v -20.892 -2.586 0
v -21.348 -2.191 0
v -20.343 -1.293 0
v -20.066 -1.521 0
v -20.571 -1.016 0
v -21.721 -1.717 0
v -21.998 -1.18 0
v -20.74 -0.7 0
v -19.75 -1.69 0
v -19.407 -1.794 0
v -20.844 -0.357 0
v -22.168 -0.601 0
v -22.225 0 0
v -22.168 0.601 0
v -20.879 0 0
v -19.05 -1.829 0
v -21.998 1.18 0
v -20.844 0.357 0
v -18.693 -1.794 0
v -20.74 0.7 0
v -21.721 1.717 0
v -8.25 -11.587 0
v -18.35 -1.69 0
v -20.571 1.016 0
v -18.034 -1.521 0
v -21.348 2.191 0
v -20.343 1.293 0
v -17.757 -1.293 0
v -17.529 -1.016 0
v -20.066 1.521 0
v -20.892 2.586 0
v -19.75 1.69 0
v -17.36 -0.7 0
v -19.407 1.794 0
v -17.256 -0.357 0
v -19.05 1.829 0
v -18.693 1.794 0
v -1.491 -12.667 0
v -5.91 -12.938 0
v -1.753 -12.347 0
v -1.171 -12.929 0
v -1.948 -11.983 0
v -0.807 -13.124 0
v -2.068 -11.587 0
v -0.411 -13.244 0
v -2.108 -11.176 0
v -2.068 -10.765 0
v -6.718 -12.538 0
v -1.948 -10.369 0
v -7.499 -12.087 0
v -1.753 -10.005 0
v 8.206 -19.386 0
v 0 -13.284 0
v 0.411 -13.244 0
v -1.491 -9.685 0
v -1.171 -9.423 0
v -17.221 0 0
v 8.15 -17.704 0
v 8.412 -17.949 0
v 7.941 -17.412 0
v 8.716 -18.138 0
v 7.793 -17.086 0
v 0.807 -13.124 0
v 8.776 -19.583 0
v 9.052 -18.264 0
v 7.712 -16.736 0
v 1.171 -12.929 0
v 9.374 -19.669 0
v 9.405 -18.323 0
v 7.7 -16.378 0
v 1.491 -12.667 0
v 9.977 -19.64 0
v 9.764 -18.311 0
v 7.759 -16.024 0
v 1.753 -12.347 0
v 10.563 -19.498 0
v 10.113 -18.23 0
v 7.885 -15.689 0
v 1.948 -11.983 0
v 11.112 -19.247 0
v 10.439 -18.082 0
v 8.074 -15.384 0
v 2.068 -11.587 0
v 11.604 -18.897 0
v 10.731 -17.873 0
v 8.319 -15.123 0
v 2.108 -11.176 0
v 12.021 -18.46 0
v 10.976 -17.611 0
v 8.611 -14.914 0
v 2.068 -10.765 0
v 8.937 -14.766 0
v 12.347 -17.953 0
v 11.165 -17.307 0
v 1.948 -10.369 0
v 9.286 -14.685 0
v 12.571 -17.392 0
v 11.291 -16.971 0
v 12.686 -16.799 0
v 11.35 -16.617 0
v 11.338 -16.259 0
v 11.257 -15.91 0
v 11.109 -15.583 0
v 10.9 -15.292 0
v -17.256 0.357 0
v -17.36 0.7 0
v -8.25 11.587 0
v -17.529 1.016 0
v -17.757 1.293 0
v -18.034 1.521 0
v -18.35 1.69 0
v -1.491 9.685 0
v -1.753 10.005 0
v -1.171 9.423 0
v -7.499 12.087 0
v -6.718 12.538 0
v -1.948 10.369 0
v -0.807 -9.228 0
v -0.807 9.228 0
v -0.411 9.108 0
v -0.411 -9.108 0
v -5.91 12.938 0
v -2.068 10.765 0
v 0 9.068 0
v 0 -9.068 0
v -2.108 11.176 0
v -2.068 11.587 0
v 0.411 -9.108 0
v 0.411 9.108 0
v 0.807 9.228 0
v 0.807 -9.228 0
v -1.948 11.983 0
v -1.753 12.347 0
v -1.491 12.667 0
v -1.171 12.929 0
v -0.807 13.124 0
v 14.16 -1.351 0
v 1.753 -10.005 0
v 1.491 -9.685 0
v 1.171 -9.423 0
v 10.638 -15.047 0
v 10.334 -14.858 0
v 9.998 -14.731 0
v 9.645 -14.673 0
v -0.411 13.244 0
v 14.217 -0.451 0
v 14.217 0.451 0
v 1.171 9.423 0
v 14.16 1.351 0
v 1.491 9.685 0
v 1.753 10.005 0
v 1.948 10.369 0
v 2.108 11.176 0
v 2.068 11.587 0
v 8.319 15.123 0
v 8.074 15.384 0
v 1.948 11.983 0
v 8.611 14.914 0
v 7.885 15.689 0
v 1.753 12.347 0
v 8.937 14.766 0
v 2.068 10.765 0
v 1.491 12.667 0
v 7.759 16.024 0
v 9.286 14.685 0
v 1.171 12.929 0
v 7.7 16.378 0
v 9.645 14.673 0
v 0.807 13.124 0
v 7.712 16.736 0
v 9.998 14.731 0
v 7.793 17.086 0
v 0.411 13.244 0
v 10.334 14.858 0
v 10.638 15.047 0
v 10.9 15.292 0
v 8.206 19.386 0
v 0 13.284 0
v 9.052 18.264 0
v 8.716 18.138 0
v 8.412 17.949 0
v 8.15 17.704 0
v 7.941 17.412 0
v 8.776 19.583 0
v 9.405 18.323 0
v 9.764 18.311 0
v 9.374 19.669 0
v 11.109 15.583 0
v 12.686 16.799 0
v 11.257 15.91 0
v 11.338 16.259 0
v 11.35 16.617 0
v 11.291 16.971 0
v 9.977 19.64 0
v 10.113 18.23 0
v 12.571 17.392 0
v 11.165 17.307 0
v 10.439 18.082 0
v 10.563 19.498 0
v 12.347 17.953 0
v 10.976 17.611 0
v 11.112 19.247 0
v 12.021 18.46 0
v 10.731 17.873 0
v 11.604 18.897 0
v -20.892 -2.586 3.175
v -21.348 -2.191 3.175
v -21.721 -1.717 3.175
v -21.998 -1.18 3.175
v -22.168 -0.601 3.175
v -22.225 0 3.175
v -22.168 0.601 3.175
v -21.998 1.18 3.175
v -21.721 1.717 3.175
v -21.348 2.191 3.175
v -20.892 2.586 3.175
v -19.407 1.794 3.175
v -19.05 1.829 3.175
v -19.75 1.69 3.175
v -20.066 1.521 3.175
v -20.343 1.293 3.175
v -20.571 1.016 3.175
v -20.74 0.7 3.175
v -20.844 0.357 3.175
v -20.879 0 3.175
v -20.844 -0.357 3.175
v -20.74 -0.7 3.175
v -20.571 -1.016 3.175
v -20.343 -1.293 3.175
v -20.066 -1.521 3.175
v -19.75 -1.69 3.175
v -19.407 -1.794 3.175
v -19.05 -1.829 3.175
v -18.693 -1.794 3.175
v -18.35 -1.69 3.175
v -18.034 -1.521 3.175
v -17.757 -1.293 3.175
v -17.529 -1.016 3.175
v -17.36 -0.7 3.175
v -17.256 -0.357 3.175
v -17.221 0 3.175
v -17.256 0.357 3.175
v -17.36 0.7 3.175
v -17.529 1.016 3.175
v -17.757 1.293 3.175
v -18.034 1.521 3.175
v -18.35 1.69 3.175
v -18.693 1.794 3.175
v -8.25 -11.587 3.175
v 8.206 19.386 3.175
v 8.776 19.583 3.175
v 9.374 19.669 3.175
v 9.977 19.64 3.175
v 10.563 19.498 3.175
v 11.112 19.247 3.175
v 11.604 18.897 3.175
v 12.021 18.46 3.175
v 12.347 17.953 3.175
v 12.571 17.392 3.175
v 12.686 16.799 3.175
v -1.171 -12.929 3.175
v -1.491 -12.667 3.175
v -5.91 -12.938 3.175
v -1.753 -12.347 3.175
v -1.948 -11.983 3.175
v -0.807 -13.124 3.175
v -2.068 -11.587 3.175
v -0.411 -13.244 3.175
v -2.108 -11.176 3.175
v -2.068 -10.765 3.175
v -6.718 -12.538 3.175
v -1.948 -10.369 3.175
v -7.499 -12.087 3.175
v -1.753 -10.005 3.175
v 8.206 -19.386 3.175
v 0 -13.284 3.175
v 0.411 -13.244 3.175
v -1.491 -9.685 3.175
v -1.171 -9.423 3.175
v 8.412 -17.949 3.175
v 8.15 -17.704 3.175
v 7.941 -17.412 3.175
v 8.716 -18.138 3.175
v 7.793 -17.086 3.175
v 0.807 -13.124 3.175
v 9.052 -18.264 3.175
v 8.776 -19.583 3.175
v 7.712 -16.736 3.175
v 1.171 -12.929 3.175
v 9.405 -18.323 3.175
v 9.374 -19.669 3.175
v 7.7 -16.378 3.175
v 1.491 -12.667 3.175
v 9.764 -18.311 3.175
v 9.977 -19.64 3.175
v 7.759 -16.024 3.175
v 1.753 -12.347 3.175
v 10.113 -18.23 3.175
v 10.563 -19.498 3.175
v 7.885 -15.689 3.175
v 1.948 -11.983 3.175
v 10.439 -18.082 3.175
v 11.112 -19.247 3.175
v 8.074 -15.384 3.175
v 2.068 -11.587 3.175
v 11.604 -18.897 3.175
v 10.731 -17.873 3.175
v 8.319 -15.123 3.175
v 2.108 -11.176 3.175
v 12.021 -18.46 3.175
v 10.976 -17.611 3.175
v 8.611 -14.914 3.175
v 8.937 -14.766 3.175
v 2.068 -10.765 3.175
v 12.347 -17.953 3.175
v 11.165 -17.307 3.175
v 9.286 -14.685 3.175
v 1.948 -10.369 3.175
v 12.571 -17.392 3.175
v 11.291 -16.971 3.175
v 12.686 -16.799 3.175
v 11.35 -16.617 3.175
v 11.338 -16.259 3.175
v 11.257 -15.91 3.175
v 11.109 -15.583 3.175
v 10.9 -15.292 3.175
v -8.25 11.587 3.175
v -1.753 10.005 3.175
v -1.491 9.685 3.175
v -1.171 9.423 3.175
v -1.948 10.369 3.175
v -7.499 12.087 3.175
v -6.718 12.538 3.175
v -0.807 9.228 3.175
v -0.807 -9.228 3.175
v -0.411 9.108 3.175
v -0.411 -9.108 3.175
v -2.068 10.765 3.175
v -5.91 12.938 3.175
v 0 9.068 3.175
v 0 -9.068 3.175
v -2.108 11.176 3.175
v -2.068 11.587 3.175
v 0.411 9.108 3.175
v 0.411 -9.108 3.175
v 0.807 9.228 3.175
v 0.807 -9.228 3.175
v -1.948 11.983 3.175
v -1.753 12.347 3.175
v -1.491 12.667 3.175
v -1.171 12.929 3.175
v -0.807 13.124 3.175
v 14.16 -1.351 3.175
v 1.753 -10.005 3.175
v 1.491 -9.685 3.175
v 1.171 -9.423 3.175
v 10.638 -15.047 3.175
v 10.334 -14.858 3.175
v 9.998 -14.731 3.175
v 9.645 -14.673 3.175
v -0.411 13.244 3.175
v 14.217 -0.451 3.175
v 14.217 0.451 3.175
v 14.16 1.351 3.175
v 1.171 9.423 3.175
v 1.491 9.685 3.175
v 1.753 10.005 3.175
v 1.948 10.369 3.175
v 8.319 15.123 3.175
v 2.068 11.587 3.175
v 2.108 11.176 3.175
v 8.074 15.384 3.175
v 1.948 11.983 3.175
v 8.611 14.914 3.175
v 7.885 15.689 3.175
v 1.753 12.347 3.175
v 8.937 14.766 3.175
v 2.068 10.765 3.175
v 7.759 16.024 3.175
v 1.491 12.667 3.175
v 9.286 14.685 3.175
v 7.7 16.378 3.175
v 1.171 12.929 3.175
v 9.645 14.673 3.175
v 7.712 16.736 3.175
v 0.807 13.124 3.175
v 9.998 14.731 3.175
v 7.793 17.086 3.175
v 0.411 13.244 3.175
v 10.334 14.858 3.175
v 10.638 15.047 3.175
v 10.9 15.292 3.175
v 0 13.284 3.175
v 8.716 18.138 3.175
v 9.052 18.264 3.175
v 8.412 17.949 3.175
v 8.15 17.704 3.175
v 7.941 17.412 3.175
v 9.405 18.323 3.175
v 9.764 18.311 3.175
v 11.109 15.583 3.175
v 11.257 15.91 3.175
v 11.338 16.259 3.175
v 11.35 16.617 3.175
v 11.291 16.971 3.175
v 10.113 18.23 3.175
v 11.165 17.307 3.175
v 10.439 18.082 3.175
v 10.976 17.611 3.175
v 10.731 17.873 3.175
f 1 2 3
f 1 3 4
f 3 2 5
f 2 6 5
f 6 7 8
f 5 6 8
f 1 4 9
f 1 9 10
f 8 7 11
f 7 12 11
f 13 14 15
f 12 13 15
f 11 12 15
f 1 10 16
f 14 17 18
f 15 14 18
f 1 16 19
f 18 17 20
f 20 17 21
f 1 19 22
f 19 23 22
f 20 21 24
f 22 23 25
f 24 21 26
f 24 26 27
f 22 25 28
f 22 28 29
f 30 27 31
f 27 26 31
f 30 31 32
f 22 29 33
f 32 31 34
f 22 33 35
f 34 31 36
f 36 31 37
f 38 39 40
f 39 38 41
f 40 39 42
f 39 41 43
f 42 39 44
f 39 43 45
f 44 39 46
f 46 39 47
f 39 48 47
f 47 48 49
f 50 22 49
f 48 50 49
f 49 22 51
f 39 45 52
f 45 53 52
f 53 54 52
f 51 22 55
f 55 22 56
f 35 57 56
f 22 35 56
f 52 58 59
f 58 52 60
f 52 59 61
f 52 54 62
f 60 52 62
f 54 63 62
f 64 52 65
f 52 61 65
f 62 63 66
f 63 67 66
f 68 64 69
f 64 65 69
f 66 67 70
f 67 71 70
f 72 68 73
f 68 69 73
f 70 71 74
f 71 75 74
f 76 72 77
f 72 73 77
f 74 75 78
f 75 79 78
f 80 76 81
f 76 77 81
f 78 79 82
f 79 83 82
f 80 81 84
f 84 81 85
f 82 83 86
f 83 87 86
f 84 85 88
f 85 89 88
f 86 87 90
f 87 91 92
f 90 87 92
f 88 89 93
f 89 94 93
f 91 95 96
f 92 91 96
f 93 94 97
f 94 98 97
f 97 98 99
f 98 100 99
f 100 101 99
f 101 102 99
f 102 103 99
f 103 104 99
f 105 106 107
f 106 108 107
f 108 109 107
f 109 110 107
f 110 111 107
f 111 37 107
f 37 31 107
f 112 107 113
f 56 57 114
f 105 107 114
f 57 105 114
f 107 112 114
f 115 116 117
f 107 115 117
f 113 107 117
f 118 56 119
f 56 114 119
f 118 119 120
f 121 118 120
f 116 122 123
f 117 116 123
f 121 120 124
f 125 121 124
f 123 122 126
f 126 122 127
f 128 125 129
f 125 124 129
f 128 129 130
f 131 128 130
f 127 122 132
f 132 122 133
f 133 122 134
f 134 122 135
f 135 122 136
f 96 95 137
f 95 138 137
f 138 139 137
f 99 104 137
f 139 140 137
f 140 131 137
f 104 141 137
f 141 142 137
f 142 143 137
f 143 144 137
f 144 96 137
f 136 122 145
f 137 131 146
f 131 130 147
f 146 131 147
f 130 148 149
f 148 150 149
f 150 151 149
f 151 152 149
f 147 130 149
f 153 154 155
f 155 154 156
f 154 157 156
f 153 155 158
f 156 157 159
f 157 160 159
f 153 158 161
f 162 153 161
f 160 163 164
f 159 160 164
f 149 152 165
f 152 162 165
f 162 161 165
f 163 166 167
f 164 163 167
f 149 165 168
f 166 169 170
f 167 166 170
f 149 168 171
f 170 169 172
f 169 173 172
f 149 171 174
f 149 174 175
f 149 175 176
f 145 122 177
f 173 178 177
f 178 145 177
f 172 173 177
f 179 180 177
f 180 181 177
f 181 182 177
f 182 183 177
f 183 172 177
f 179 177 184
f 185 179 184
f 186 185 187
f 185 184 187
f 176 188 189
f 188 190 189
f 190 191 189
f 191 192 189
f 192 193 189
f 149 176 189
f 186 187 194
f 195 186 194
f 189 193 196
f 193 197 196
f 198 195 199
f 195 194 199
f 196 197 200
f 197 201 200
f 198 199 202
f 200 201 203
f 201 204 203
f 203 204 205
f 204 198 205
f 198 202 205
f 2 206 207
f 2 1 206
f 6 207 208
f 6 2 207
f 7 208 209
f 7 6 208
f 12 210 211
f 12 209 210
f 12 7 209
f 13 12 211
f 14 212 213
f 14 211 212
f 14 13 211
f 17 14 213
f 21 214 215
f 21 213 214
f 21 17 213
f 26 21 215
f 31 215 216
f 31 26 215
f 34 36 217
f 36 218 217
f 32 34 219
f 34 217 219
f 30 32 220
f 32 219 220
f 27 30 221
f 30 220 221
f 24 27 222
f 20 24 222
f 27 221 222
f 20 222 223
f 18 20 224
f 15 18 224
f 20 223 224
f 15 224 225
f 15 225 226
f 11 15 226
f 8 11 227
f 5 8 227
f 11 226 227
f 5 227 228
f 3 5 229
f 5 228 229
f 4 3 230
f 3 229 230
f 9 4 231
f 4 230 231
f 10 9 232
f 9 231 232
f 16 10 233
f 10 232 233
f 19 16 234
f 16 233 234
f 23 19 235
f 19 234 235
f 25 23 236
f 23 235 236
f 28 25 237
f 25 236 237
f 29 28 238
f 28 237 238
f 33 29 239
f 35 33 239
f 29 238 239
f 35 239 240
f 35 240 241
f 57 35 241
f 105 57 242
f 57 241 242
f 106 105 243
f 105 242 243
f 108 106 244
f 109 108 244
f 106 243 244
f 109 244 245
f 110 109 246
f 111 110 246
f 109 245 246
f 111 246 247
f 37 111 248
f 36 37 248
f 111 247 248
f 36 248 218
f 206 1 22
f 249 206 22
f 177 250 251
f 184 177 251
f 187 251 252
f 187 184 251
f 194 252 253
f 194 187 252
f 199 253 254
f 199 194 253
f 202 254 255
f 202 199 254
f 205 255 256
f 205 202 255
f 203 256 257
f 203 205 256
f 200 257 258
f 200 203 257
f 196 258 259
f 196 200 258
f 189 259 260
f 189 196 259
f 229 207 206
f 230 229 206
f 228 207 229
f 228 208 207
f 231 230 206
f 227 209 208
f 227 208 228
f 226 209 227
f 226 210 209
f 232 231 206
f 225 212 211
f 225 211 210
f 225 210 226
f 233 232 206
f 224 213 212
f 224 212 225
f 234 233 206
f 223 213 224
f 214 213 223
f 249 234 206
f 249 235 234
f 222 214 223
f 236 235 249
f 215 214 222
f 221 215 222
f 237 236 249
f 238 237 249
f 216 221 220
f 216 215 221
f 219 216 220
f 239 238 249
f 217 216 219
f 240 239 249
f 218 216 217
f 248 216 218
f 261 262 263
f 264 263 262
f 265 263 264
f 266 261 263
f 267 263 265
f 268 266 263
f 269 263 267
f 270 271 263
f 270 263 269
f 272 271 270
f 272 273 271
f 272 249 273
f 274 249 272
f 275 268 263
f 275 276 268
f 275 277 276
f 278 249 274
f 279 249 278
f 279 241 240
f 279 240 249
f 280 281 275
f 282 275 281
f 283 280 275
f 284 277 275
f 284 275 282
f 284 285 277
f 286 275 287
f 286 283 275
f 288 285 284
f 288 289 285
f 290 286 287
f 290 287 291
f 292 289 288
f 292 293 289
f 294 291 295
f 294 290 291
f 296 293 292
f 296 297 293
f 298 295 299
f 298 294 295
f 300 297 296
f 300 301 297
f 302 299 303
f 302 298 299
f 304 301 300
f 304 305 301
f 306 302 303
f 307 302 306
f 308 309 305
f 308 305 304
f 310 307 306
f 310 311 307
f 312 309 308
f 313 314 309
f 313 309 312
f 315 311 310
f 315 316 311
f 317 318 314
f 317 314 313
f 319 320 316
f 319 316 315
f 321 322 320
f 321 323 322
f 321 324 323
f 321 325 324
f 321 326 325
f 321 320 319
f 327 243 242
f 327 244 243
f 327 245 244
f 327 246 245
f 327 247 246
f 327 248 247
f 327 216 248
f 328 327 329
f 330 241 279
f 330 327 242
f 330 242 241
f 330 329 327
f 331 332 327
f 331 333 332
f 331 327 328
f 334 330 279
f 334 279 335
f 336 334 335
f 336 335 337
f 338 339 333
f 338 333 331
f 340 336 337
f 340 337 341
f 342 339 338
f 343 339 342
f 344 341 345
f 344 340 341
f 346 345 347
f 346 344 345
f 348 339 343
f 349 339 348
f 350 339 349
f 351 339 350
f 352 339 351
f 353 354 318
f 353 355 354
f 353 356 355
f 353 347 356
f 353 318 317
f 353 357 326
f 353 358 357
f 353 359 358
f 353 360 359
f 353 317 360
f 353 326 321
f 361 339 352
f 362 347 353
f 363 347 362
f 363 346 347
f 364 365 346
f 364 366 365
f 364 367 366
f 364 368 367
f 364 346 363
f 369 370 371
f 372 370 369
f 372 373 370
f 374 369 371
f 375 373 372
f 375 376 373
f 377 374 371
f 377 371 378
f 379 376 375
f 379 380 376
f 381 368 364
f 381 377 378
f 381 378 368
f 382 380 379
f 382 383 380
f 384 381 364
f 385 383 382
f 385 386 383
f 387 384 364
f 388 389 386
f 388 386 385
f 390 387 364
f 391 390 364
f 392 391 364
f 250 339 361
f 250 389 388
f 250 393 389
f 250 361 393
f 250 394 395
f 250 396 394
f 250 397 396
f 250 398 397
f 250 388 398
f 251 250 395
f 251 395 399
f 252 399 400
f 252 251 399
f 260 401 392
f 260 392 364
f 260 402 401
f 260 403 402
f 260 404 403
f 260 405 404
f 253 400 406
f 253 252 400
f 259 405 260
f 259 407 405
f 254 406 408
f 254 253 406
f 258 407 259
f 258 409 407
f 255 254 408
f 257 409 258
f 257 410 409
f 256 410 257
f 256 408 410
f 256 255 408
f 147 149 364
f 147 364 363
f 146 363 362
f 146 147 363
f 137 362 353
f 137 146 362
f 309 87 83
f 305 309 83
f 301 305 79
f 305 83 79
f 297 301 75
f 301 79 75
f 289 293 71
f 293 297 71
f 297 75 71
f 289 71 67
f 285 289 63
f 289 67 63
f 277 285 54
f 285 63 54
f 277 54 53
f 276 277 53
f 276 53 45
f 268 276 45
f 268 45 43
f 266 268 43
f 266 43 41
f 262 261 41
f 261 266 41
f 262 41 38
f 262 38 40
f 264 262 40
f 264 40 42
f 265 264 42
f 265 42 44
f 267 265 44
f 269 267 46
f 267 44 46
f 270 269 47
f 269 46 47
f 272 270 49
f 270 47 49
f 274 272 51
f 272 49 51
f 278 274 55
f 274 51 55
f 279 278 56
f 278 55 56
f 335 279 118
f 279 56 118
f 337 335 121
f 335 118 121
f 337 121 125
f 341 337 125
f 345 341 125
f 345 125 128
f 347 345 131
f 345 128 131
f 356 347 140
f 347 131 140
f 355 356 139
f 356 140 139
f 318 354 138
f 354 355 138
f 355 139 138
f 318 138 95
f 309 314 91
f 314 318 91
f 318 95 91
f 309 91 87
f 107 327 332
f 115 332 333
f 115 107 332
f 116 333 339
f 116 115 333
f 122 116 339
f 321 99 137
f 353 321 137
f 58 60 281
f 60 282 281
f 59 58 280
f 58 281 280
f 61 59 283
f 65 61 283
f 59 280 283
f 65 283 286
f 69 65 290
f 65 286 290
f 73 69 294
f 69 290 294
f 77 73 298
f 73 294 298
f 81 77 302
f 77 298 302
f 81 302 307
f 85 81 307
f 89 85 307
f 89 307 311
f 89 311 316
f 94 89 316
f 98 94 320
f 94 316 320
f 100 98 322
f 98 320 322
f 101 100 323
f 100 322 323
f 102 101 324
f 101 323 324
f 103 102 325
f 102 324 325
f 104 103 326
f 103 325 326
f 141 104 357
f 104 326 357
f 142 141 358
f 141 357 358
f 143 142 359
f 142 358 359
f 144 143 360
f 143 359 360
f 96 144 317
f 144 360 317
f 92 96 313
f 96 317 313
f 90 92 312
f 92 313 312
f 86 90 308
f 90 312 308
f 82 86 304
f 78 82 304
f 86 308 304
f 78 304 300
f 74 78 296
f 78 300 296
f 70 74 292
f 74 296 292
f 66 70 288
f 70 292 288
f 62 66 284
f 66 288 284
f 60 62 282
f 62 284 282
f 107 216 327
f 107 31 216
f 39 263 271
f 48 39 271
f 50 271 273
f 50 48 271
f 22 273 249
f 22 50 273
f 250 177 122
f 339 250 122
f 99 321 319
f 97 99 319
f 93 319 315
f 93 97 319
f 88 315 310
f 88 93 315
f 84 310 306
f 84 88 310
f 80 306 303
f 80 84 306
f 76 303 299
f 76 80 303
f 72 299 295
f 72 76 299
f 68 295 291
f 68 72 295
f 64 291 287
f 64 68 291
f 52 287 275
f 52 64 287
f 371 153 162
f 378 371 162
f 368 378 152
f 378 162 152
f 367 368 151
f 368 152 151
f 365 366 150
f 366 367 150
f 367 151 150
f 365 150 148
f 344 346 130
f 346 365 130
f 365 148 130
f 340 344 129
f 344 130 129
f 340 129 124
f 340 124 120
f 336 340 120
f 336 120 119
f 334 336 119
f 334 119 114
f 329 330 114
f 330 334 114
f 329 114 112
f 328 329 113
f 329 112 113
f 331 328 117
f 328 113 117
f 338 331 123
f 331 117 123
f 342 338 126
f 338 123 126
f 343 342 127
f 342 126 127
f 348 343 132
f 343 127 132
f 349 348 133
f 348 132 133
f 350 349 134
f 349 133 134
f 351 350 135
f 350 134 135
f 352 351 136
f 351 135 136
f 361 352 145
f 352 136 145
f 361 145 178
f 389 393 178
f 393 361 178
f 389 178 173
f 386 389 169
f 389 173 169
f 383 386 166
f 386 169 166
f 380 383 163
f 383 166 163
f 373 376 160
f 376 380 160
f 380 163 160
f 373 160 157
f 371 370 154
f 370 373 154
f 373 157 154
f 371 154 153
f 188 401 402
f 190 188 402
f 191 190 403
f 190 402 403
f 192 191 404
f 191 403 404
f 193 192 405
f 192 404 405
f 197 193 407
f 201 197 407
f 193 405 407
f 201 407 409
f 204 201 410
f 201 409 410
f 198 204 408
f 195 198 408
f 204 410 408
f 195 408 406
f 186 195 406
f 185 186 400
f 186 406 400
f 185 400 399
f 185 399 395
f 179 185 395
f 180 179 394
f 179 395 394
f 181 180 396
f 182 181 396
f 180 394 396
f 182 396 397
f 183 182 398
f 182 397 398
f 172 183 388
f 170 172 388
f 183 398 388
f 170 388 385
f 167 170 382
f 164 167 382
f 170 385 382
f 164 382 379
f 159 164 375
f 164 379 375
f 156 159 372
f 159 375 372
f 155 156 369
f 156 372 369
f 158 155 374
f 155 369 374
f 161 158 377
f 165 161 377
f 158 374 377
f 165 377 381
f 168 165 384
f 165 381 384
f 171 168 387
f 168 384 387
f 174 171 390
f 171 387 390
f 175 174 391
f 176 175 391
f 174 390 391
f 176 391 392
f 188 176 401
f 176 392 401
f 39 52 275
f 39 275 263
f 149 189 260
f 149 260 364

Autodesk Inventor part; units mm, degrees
ref_plane "YZ Plane" through (0, 0, 0) normal (1, 0, 0) x (0, 1, 0)
ref_plane "XZ Plane" through (0, 0, 0) normal (0, 1, 0) x (-1, 0, 0)
ref_plane "XY Plane" through (0, 0, 0) normal (0, 0, 1) x (1, 0, 0)
sketch "Sketch1" plane through (0, 0, 0) normal (0, 0, 1) x (1, 0, 0)
  circle A0 centre (0, 0) radius 14.224
  circle A1 centre (0, 0) radius 19.05 construction
  line L0 (0, 0) -> (-19.05, 0)
  circle A2 centre (-19.05, 0) radius 3.175
  circle A3 centre (0, 11.176) radius 2.1082
  line L1 (0, 0) -> (0, 11.176)
  line L2 (0, 0) -> (0, -11.176)
  circle A4 centre (0, -11.176) radius 2.1082
  line L3 (-20.8915, 2.5864) -> (-8.2499, 11.5871)
  line L4 (-20.8915, -2.5864) -> (-8.2499, -11.5871)
  dimension "d1" = 38.1
  dimension "d0" = 28.448
  dimension "d2" = 6.35
  dimension "d3" = 11.176
  dimension "d4" = 11.176
  dimension "d5" = 4.2164
  dimension "d6" = 4.2164
extrude "Extrusion1" add sketch "Sketch1" along normal blind 3.175 contours A0
extrude "Extrusion2" add sketch "Sketch1" along normal blind 3.175 contours A0 L0 A2 L3 | L4 A2 L0 A0 | A2
hole "Hole1" at (-19.05, 0, 0) direction (0, 0, 1) diameter 3.6576 end through all clearance for "Socket Head Cap Screw" size "#6" standard "Ansi Unified Screw Threads"
pattern_circular "Circular Pattern2" count 3 over 360 about axis through (0, 0, 0) along (0, 0, 1) of "Extrusion2", "Hole1"
properties part number "Mounting Plate"
